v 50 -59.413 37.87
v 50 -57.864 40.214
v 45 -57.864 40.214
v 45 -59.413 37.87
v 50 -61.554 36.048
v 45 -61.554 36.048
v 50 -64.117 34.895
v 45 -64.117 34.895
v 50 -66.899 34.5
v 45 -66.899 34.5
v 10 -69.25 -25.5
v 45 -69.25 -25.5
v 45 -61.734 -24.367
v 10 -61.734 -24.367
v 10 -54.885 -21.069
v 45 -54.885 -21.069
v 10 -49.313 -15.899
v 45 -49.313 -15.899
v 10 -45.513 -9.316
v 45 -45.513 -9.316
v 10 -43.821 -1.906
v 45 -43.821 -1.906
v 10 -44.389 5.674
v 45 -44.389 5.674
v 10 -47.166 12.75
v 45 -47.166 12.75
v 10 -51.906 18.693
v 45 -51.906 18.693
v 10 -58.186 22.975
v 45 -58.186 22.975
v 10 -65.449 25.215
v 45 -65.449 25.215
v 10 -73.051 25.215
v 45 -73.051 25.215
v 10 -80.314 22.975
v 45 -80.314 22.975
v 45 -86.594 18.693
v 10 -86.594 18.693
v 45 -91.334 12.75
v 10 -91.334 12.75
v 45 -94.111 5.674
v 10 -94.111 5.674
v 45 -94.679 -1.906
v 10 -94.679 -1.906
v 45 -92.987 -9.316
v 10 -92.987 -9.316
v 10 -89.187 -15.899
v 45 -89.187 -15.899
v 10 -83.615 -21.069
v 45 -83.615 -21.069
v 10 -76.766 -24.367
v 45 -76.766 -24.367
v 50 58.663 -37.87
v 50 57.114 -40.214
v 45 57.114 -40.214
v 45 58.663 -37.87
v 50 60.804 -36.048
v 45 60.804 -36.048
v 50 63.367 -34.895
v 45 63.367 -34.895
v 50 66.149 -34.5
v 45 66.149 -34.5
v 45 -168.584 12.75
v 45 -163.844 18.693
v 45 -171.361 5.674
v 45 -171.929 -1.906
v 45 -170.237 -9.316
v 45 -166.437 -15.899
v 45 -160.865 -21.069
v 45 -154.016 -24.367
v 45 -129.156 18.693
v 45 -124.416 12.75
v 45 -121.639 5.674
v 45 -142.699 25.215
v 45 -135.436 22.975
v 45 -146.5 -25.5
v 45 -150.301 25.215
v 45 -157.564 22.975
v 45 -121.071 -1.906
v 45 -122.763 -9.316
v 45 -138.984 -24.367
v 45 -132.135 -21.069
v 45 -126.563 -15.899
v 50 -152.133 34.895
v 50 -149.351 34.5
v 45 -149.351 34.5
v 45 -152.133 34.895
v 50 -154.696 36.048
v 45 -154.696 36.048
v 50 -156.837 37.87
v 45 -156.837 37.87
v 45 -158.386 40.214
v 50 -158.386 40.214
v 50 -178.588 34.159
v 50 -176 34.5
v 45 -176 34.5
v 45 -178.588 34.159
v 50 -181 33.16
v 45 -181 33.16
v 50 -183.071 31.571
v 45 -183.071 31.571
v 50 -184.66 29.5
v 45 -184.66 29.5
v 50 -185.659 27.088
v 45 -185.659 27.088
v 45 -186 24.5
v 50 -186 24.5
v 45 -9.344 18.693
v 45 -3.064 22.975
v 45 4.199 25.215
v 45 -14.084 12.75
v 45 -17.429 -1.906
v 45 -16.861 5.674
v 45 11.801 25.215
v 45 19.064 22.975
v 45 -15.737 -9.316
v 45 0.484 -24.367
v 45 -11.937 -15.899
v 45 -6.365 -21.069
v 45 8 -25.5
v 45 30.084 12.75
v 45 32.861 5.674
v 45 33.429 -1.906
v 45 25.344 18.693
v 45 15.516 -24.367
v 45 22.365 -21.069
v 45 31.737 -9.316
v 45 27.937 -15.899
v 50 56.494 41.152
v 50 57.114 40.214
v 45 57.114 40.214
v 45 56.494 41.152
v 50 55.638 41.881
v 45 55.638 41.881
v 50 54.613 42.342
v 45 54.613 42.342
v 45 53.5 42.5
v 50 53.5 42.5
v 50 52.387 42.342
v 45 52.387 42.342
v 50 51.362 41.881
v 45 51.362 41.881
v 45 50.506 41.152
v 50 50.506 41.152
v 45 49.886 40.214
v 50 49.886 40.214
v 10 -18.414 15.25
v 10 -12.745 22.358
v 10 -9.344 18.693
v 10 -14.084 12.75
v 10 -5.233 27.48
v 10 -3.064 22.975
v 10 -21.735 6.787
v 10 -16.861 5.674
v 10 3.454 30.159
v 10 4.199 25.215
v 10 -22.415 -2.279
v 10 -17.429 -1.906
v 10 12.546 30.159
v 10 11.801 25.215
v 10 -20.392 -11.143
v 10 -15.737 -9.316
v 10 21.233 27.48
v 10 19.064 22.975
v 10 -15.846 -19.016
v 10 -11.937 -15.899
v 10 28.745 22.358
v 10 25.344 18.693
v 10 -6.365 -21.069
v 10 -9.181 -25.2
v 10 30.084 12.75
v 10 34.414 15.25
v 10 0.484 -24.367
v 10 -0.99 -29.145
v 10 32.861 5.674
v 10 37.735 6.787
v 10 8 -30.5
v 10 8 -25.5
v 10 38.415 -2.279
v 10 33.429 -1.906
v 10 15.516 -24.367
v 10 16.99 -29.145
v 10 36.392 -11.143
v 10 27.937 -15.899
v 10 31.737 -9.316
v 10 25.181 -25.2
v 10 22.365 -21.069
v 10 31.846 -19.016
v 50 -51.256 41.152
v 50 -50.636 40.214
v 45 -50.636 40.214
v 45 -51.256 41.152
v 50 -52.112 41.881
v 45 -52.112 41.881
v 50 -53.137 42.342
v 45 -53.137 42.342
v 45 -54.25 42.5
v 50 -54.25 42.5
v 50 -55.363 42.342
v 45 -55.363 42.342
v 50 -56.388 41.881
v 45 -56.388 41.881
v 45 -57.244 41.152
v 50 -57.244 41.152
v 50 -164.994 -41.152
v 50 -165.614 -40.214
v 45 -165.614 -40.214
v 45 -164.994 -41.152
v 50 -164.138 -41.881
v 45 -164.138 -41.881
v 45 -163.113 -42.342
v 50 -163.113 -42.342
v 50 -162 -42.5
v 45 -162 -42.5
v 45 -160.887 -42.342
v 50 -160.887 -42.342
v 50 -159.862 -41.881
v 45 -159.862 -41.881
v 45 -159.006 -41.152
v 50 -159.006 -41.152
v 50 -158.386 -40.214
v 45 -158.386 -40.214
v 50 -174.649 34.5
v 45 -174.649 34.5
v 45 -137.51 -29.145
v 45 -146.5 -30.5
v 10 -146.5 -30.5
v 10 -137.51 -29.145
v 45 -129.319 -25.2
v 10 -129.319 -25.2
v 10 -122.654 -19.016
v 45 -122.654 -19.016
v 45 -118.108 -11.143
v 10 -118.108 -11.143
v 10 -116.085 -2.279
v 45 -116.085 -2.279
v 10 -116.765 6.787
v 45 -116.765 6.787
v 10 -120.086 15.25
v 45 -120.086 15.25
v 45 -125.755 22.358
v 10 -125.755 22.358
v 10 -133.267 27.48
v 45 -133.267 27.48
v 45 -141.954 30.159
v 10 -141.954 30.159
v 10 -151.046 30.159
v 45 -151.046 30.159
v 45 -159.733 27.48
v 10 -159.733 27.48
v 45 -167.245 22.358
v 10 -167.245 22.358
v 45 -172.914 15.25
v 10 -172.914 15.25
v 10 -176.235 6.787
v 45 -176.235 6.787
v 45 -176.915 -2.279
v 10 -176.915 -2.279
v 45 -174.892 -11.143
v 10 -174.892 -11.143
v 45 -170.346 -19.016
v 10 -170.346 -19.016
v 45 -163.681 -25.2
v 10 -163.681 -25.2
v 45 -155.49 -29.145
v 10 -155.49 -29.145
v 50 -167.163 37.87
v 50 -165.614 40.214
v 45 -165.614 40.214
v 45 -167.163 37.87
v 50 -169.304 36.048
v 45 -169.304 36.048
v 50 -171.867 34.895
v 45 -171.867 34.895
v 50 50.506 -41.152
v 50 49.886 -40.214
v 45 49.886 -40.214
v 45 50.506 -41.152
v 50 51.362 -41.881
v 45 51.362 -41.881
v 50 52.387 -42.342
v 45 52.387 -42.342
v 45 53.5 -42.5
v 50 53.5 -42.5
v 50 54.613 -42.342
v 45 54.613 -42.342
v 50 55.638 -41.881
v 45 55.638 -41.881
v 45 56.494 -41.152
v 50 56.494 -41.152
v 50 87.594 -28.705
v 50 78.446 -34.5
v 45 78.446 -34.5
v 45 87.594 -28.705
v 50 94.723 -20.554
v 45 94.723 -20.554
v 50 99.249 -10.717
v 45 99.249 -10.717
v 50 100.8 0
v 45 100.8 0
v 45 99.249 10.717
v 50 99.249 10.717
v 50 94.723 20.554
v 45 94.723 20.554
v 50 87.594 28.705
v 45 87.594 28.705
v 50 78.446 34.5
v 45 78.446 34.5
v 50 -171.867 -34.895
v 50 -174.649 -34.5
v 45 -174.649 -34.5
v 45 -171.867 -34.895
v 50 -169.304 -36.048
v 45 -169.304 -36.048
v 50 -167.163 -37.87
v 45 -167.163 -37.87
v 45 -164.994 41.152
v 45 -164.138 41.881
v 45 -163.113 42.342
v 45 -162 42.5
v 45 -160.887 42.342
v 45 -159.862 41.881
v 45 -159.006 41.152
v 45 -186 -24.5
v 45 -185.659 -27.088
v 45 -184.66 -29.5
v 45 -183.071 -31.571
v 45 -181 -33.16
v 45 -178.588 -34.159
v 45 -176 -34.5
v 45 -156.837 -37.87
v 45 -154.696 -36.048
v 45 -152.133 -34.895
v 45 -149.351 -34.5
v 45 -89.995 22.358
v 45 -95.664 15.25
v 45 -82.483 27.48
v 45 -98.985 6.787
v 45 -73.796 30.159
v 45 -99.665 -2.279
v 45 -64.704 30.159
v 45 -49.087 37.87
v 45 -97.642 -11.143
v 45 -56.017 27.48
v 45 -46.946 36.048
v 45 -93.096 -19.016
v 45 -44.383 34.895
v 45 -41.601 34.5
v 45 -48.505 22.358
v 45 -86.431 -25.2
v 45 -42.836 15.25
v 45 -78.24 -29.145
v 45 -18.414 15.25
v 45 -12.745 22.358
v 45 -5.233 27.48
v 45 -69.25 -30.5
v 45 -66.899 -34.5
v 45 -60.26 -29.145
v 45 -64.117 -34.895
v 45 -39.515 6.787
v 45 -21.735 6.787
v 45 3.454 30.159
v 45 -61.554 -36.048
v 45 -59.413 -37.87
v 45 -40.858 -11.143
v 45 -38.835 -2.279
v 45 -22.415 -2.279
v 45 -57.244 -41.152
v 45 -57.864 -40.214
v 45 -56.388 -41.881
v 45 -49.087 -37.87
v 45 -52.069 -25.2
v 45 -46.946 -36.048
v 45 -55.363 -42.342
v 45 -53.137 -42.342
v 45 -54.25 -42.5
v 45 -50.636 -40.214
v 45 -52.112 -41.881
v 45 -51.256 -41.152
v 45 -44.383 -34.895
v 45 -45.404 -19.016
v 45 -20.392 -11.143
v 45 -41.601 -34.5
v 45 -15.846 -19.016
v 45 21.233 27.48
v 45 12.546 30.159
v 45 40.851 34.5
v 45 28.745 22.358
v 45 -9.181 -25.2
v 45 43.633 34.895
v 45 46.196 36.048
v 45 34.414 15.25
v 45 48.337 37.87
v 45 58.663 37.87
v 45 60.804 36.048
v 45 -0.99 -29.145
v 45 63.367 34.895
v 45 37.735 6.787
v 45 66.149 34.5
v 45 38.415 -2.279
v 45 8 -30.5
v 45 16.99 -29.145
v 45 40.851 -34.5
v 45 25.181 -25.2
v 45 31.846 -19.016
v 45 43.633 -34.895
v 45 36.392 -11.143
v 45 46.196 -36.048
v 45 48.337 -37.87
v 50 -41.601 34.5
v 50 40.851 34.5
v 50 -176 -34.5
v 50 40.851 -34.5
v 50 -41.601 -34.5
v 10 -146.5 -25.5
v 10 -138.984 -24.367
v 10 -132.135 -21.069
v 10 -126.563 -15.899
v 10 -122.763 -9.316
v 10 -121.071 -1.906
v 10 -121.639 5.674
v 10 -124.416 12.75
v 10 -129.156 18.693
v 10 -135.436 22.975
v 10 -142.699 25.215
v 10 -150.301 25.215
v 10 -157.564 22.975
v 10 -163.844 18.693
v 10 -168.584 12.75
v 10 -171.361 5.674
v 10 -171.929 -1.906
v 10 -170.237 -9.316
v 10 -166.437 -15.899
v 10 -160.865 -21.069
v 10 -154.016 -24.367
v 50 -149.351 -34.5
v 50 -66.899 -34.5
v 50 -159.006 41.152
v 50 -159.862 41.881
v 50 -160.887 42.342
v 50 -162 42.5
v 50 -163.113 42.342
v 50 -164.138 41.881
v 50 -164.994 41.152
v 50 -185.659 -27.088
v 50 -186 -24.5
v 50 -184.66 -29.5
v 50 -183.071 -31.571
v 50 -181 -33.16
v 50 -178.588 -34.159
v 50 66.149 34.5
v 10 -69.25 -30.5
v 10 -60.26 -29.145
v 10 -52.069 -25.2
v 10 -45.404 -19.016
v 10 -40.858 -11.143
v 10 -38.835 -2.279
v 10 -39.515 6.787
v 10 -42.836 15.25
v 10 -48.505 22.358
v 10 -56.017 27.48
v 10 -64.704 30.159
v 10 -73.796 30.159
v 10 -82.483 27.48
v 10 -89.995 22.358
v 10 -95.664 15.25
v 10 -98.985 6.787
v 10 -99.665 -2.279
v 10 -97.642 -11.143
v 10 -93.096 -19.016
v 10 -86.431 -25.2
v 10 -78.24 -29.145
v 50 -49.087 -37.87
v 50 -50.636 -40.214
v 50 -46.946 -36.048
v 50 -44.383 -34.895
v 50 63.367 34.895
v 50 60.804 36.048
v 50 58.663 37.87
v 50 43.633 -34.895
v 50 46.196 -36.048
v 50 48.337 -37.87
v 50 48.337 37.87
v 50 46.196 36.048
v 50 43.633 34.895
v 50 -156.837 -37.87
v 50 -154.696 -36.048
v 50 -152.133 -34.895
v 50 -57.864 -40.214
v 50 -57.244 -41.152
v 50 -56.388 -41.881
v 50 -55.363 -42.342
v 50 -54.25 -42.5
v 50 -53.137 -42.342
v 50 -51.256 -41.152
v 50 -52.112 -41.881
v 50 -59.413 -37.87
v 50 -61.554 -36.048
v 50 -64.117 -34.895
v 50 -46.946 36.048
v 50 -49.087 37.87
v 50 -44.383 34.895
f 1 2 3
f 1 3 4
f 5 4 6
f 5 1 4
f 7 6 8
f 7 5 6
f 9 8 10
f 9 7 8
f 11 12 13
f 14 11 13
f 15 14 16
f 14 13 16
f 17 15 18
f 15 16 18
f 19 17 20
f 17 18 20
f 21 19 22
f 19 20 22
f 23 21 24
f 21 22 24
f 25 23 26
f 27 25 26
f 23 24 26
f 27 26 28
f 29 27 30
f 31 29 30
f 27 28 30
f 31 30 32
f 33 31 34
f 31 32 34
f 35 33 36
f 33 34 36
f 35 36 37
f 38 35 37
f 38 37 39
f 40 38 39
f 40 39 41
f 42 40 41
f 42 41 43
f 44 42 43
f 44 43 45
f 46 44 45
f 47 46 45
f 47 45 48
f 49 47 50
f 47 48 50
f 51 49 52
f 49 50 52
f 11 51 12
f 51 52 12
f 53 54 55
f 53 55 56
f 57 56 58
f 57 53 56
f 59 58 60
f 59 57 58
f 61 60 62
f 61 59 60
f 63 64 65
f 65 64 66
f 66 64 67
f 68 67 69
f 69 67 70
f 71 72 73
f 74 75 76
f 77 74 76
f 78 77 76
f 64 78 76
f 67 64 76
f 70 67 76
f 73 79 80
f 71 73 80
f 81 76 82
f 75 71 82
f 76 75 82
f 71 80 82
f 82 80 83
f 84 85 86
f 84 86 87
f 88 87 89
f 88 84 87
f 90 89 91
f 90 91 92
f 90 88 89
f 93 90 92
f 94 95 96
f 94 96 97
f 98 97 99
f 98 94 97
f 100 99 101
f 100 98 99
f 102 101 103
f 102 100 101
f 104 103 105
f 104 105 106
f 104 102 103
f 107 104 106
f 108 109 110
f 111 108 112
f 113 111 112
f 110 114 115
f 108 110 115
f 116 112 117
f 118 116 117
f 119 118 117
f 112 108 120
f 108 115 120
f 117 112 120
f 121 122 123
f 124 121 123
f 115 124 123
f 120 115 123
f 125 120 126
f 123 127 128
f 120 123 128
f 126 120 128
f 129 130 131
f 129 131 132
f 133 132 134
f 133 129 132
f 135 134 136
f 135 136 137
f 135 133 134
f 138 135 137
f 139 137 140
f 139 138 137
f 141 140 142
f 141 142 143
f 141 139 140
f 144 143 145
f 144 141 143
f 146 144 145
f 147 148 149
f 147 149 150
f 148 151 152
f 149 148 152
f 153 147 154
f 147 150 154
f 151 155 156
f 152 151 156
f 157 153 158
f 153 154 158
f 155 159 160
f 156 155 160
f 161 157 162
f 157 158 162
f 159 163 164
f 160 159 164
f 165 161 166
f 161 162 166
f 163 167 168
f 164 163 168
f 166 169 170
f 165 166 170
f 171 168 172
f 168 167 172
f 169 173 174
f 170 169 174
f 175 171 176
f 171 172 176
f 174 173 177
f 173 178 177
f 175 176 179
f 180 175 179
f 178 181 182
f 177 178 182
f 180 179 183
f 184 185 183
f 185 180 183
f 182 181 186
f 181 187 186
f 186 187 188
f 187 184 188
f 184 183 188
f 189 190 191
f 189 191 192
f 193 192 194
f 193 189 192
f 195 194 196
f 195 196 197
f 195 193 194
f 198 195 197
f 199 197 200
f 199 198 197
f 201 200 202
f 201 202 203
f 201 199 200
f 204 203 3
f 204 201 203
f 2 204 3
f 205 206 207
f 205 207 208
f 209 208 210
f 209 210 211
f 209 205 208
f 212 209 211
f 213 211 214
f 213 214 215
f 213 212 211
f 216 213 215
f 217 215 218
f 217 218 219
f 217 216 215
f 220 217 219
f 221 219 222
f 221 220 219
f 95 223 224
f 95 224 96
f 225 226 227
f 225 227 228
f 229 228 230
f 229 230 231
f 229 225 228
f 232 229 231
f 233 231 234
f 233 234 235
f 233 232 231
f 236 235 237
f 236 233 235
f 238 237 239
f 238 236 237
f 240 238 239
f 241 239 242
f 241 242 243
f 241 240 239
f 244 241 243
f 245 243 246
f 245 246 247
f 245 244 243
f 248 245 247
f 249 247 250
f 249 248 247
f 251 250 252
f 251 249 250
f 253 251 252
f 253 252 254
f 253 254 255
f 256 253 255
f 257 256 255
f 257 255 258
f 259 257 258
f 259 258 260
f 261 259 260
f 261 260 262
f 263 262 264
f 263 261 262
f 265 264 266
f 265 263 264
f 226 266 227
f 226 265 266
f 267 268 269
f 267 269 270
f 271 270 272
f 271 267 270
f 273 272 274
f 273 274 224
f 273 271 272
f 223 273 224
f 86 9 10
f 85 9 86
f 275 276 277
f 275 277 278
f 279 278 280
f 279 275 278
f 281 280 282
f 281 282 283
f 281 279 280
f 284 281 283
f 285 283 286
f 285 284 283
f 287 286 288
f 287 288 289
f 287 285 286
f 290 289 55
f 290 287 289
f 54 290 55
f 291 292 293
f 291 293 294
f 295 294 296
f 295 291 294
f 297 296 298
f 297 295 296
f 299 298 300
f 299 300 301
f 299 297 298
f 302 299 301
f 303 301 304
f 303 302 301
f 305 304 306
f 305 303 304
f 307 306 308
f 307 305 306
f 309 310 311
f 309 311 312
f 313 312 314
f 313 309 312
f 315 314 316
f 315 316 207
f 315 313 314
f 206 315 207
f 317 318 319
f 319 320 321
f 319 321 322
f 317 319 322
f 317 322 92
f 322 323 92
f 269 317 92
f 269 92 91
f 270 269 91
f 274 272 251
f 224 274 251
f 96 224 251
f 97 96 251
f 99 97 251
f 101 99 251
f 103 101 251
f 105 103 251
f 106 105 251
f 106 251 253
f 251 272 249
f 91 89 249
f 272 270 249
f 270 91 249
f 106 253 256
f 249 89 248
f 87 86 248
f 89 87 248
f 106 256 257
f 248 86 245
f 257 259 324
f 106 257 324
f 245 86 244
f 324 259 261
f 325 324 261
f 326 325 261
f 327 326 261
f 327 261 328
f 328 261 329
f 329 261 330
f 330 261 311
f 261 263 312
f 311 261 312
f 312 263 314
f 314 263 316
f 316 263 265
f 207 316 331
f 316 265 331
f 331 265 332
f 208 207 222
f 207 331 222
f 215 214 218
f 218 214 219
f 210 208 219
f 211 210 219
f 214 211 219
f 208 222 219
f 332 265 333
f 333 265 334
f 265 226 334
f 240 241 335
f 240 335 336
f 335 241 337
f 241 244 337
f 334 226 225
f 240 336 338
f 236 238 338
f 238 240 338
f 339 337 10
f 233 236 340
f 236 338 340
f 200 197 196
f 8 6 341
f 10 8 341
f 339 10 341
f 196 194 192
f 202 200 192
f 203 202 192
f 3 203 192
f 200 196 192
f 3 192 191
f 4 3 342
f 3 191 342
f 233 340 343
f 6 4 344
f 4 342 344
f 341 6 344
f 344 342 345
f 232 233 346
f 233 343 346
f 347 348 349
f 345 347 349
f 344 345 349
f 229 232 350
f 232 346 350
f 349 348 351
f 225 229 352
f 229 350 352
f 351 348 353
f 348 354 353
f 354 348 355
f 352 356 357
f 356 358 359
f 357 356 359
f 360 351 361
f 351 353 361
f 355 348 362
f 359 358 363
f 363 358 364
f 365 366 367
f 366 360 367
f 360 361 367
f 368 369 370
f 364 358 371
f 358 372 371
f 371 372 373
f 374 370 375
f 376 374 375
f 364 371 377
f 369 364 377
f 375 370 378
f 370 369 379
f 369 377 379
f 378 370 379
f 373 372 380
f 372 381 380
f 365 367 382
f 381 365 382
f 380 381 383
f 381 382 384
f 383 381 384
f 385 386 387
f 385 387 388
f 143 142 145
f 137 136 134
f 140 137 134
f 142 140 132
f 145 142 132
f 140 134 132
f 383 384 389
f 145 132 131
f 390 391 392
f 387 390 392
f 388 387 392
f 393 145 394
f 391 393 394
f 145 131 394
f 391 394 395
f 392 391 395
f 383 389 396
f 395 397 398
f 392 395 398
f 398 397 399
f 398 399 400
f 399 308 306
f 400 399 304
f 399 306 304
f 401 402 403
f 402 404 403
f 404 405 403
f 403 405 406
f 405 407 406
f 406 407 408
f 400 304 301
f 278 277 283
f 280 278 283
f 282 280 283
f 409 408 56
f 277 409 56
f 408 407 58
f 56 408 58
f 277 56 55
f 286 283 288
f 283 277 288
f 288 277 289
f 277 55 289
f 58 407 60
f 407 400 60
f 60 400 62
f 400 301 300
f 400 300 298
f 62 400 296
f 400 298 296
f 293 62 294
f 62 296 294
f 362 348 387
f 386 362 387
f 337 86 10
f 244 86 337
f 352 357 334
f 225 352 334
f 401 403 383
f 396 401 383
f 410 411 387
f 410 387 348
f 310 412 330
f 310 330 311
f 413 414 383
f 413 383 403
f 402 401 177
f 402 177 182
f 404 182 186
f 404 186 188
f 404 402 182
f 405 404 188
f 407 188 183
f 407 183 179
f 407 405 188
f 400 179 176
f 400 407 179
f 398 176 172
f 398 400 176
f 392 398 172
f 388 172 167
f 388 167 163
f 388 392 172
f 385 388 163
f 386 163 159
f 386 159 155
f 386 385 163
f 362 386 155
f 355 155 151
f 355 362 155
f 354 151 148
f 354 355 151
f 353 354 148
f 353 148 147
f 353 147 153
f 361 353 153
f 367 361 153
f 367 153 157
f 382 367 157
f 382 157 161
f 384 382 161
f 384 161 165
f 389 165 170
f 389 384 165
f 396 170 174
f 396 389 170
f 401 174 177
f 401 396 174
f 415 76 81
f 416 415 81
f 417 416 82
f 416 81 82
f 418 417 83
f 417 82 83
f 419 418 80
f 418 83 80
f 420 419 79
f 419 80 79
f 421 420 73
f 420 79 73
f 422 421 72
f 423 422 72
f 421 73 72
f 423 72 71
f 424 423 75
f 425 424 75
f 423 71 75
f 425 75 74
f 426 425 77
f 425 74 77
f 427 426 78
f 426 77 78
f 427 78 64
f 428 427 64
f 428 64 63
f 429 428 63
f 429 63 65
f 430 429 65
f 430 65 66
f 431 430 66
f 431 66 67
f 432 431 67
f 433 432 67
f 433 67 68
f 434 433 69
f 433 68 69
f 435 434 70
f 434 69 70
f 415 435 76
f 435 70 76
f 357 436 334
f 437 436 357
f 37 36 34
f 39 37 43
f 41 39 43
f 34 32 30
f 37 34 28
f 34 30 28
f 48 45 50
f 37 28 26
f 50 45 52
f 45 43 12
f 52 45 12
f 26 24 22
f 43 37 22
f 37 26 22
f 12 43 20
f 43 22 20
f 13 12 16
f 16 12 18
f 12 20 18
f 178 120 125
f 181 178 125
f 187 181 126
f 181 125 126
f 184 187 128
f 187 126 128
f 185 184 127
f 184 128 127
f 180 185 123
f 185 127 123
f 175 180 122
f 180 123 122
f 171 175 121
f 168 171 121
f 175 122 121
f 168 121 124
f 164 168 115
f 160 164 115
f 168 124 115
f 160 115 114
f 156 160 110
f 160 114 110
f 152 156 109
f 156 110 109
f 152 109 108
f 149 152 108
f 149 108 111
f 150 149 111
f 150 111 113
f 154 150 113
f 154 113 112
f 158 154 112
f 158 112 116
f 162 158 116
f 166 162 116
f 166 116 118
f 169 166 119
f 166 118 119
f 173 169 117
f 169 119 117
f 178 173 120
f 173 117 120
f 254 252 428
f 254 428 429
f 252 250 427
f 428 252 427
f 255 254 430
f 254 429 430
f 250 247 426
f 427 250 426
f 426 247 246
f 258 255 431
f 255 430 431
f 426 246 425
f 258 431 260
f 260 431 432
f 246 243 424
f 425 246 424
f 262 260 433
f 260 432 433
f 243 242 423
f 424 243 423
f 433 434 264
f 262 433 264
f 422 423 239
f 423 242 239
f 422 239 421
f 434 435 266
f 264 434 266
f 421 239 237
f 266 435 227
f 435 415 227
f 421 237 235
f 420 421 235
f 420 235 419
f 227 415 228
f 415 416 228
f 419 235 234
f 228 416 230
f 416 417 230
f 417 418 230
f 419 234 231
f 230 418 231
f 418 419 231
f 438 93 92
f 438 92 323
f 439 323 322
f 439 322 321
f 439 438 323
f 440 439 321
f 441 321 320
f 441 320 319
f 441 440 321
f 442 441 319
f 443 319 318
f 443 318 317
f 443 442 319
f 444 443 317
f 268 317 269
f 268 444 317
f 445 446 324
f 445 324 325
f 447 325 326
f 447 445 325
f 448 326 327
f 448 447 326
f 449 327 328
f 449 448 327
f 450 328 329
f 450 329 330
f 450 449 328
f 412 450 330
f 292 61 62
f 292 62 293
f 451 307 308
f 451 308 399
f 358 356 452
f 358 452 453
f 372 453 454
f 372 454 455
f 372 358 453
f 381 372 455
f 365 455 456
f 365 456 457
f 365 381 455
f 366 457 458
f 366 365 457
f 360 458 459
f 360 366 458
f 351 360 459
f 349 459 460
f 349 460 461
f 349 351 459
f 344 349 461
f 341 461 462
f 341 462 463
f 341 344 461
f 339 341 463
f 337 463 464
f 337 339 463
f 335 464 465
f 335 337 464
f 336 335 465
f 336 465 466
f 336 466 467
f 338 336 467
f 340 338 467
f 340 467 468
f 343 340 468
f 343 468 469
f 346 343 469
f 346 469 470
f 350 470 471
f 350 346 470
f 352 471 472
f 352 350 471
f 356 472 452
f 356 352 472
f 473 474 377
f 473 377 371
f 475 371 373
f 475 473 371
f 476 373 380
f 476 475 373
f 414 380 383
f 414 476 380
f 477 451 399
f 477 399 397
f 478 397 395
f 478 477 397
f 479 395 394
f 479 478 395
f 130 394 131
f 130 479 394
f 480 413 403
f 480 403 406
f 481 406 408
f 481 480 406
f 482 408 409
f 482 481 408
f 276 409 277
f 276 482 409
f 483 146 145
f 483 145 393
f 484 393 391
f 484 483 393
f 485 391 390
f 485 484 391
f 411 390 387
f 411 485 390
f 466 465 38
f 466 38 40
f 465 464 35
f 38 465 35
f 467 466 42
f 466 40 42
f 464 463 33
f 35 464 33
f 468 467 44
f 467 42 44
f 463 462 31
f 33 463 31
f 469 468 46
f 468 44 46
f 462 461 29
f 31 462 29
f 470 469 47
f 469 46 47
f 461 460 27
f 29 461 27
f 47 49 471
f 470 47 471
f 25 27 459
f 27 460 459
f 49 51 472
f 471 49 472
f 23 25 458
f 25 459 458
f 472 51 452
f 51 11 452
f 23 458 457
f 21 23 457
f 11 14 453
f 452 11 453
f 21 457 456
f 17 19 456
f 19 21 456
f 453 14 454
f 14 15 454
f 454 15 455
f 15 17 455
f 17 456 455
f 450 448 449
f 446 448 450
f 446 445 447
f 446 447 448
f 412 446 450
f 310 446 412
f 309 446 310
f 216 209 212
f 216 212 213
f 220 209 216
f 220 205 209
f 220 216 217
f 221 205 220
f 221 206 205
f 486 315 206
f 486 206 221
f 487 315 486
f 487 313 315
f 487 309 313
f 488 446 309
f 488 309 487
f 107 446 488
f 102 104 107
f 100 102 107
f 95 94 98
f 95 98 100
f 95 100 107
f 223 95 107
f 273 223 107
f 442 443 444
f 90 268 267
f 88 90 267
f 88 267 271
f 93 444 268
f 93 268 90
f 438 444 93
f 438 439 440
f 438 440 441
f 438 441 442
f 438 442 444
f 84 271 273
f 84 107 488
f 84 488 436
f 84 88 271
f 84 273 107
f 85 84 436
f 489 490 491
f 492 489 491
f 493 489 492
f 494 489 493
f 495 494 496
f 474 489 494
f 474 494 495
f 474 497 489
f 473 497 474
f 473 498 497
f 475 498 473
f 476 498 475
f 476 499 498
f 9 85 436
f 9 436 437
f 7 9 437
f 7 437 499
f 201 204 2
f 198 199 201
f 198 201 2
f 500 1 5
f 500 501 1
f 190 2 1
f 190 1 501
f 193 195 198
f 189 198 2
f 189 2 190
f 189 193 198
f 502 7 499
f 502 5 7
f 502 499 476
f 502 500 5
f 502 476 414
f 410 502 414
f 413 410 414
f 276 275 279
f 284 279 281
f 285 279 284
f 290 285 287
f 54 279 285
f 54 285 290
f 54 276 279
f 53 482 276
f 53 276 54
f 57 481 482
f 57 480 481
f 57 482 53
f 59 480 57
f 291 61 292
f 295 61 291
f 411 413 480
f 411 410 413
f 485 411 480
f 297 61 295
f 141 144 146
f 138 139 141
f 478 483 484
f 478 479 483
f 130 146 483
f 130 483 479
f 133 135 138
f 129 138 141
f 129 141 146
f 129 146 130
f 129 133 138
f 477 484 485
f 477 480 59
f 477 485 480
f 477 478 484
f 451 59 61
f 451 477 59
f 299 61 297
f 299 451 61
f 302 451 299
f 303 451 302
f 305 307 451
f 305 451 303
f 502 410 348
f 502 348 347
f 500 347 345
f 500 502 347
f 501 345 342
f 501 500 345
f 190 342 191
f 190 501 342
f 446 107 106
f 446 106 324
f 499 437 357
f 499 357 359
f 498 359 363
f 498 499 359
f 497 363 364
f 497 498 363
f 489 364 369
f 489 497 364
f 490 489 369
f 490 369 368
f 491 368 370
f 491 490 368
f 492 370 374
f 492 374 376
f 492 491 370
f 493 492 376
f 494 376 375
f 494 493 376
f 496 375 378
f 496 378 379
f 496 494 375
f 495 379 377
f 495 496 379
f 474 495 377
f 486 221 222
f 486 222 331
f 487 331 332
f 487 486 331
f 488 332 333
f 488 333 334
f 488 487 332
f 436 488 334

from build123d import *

# Parameters (mm, degrees)
BOSS_EXTRUDE2_START = 50
BOSS_EXTRUDE2_DEPTH = 5
BOSS_EXTRUDE3_START = 55
SKETCH3_R           = 30.5
SKETCH3_R_2         = 25.5
BOSS_EXTRUDE3_DEPTH = 35


# Read off the part's stored shape, not the designer's step: Intersect2
with BuildPart() as part:
    # Sketch2<8> → Boss-Extrude2 (new body)
    with BuildSketch(Plane(origin=(0, 0, 0), x_dir=(0, 0, -1), z_dir=(1, 0, 0)).offset(BOSS_EXTRUDE2_START)):
        with BuildLine():
            Line((-34.5, 78.446358794), (-34.5, 66.149110641))
            ThreePointArc((-34.5, 66.149110641), (-36.048457453, 60.803885802), (-40.214285714, 57.114031612))
            ThreePointArc((-40.214285714, 57.114031612), (-42.5, 53.5), (-40.214285714, 49.885968388))
            ThreePointArc((-40.214285714, 49.885968388), (-36.048457453, 46.196114198), (-34.5, 40.850889359))
            Line((-34.5, 40.850889359), (-34.5, -41.600889359))
            ThreePointArc((-34.5, -41.600889359), (-36.048457453, -46.946114198), (-40.214285714, -50.635968388))
            ThreePointArc((-40.214285714, -50.635968388), (-42.5, -54.25), (-40.214285714, -57.864031612))
            ThreePointArc((-40.214285714, -57.864031612), (-36.048457453, -61.553885802), (-34.5, -66.899110641))
            Line((-34.5, -66.899110641), (-34.5, -149.350889359))
            ThreePointArc((-34.5, -149.350889359), (-36.048457453, -154.696114198), (-40.214285714, -158.385968388))
            ThreePointArc((-40.214285714, -158.385968388), (-42.5, -162), (-40.214285714, -165.614031612))
            ThreePointArc((-40.214285714, -165.614031612), (-36.048457453, -169.303885802), (-34.5, -174.649110641))
            Line((-34.5, -174.649110641), (-34.5, -176))
            ThreePointArc((-34.5, -176), (-31.571067812, -183.071067812), (-24.5, -186))
            Line((-24.5, -186), (24.5, -186))
            ThreePointArc((24.5, -186), (31.571067812, -183.071067812), (34.5, -176))
            Line((34.5, -176), (34.5, -174.649110641))
            ThreePointArc((34.5, -174.649110641), (36.048457453, -169.303885802), (40.214285714, -165.614031612))
            ThreePointArc((40.214285714, -165.614031612), (42.5, -162), (40.214285714, -158.385968388))
            ThreePointArc((40.214285714, -158.385968388), (36.048457453, -154.696114198), (34.5, -149.350889359))
            Line((34.5, -149.350889359), (34.5, -66.899110641))
            ThreePointArc((34.5, -66.899110641), (36.048457453, -61.553885802), (40.214285714, -57.864031612))
            ThreePointArc((40.214285714, -57.864031612), (42.5, -54.25), (40.214285714, -50.635968388))
            ThreePointArc((40.214285714, -50.635968388), (36.048457453, -46.946114198), (34.5, -41.600889359))
            Line((34.5, -41.600889359), (34.5, 40.850889359))
            ThreePointArc((34.5, 40.850889359), (36.048457453, 46.196114198), (40.214285714, 49.885968388))
            ThreePointArc((40.214285714, 49.885968388), (42.5, 53.5), (40.214285714, 57.114031612))
            ThreePointArc((40.214285714, 57.114031612), (36.048457453, 60.803885802), (34.5, 66.149110641))
            Line((34.5, 66.149110641), (34.5, 78.446358794))
            ThreePointArc((34.5, 78.446358794), (0, 100.8), (-34.5, 78.446358794))
        make_face()
    boss_extrude2 = extrude(amount=BOSS_EXTRUDE2_DEPTH)

    # Sketch3 → Boss-Extrude3 (add)
    # profile 1 of 3: a face of its own
    with BuildSketch(Plane(origin=(0, 0, 0), x_dir=(0, 0, -1), z_dir=(1, 0, 0)).offset(BOSS_EXTRUDE3_START)):
        with Locations((0, -146.5)):
            Circle(SKETCH3_R)
        with Locations((0, -146.5)):
            Circle(SKETCH3_R_2, mode=Mode.SUBTRACT)
    # profile 2 of 3: a face of its own
    with BuildSketch(Plane(origin=(0, 0, 0), x_dir=(0, 0, -1), z_dir=(1, 0, 0)).offset(BOSS_EXTRUDE3_START)):
        with Locations((0, -69.25)):
            Circle(SKETCH3_R)
        with Locations((0, -69.25)):
            Circle(SKETCH3_R_2, mode=Mode.SUBTRACT)
    # profile 3 of 3: a face of its own
    with BuildSketch(Plane(origin=(0, 0, 0), x_dir=(0, 0, -1), z_dir=(1, 0, 0)).offset(BOSS_EXTRUDE3_START)):
        with Locations((0, 8)):
            Circle(SKETCH3_R)
        with Locations((0, 8)):
            Circle(SKETCH3_R_2, mode=Mode.SUBTRACT)
    boss_extrude3 = extrude(amount=BOSS_EXTRUDE3_DEPTH)

    # Mirror3: Boss-Extrude2, Boss-Extrude3 across plane
    add(boss_extrude2.mirror(Plane.ZY.offset(-50)))
    add(boss_extrude3.mirror(Plane.ZY.offset(-50)))


with BuildPart() as body_2:
    # Intersect2: the piece on the far side of the plane
    add(part.part)
    split(bisect_by=Plane.YZ.offset(50), keep=Keep.BOTTOM)


with BuildPart() as part_1:
    add(part.part)

    # Intersect2
    split(bisect_by=Plane.YZ.offset(50), keep=Keep.TOP)


solid = body_2.part
